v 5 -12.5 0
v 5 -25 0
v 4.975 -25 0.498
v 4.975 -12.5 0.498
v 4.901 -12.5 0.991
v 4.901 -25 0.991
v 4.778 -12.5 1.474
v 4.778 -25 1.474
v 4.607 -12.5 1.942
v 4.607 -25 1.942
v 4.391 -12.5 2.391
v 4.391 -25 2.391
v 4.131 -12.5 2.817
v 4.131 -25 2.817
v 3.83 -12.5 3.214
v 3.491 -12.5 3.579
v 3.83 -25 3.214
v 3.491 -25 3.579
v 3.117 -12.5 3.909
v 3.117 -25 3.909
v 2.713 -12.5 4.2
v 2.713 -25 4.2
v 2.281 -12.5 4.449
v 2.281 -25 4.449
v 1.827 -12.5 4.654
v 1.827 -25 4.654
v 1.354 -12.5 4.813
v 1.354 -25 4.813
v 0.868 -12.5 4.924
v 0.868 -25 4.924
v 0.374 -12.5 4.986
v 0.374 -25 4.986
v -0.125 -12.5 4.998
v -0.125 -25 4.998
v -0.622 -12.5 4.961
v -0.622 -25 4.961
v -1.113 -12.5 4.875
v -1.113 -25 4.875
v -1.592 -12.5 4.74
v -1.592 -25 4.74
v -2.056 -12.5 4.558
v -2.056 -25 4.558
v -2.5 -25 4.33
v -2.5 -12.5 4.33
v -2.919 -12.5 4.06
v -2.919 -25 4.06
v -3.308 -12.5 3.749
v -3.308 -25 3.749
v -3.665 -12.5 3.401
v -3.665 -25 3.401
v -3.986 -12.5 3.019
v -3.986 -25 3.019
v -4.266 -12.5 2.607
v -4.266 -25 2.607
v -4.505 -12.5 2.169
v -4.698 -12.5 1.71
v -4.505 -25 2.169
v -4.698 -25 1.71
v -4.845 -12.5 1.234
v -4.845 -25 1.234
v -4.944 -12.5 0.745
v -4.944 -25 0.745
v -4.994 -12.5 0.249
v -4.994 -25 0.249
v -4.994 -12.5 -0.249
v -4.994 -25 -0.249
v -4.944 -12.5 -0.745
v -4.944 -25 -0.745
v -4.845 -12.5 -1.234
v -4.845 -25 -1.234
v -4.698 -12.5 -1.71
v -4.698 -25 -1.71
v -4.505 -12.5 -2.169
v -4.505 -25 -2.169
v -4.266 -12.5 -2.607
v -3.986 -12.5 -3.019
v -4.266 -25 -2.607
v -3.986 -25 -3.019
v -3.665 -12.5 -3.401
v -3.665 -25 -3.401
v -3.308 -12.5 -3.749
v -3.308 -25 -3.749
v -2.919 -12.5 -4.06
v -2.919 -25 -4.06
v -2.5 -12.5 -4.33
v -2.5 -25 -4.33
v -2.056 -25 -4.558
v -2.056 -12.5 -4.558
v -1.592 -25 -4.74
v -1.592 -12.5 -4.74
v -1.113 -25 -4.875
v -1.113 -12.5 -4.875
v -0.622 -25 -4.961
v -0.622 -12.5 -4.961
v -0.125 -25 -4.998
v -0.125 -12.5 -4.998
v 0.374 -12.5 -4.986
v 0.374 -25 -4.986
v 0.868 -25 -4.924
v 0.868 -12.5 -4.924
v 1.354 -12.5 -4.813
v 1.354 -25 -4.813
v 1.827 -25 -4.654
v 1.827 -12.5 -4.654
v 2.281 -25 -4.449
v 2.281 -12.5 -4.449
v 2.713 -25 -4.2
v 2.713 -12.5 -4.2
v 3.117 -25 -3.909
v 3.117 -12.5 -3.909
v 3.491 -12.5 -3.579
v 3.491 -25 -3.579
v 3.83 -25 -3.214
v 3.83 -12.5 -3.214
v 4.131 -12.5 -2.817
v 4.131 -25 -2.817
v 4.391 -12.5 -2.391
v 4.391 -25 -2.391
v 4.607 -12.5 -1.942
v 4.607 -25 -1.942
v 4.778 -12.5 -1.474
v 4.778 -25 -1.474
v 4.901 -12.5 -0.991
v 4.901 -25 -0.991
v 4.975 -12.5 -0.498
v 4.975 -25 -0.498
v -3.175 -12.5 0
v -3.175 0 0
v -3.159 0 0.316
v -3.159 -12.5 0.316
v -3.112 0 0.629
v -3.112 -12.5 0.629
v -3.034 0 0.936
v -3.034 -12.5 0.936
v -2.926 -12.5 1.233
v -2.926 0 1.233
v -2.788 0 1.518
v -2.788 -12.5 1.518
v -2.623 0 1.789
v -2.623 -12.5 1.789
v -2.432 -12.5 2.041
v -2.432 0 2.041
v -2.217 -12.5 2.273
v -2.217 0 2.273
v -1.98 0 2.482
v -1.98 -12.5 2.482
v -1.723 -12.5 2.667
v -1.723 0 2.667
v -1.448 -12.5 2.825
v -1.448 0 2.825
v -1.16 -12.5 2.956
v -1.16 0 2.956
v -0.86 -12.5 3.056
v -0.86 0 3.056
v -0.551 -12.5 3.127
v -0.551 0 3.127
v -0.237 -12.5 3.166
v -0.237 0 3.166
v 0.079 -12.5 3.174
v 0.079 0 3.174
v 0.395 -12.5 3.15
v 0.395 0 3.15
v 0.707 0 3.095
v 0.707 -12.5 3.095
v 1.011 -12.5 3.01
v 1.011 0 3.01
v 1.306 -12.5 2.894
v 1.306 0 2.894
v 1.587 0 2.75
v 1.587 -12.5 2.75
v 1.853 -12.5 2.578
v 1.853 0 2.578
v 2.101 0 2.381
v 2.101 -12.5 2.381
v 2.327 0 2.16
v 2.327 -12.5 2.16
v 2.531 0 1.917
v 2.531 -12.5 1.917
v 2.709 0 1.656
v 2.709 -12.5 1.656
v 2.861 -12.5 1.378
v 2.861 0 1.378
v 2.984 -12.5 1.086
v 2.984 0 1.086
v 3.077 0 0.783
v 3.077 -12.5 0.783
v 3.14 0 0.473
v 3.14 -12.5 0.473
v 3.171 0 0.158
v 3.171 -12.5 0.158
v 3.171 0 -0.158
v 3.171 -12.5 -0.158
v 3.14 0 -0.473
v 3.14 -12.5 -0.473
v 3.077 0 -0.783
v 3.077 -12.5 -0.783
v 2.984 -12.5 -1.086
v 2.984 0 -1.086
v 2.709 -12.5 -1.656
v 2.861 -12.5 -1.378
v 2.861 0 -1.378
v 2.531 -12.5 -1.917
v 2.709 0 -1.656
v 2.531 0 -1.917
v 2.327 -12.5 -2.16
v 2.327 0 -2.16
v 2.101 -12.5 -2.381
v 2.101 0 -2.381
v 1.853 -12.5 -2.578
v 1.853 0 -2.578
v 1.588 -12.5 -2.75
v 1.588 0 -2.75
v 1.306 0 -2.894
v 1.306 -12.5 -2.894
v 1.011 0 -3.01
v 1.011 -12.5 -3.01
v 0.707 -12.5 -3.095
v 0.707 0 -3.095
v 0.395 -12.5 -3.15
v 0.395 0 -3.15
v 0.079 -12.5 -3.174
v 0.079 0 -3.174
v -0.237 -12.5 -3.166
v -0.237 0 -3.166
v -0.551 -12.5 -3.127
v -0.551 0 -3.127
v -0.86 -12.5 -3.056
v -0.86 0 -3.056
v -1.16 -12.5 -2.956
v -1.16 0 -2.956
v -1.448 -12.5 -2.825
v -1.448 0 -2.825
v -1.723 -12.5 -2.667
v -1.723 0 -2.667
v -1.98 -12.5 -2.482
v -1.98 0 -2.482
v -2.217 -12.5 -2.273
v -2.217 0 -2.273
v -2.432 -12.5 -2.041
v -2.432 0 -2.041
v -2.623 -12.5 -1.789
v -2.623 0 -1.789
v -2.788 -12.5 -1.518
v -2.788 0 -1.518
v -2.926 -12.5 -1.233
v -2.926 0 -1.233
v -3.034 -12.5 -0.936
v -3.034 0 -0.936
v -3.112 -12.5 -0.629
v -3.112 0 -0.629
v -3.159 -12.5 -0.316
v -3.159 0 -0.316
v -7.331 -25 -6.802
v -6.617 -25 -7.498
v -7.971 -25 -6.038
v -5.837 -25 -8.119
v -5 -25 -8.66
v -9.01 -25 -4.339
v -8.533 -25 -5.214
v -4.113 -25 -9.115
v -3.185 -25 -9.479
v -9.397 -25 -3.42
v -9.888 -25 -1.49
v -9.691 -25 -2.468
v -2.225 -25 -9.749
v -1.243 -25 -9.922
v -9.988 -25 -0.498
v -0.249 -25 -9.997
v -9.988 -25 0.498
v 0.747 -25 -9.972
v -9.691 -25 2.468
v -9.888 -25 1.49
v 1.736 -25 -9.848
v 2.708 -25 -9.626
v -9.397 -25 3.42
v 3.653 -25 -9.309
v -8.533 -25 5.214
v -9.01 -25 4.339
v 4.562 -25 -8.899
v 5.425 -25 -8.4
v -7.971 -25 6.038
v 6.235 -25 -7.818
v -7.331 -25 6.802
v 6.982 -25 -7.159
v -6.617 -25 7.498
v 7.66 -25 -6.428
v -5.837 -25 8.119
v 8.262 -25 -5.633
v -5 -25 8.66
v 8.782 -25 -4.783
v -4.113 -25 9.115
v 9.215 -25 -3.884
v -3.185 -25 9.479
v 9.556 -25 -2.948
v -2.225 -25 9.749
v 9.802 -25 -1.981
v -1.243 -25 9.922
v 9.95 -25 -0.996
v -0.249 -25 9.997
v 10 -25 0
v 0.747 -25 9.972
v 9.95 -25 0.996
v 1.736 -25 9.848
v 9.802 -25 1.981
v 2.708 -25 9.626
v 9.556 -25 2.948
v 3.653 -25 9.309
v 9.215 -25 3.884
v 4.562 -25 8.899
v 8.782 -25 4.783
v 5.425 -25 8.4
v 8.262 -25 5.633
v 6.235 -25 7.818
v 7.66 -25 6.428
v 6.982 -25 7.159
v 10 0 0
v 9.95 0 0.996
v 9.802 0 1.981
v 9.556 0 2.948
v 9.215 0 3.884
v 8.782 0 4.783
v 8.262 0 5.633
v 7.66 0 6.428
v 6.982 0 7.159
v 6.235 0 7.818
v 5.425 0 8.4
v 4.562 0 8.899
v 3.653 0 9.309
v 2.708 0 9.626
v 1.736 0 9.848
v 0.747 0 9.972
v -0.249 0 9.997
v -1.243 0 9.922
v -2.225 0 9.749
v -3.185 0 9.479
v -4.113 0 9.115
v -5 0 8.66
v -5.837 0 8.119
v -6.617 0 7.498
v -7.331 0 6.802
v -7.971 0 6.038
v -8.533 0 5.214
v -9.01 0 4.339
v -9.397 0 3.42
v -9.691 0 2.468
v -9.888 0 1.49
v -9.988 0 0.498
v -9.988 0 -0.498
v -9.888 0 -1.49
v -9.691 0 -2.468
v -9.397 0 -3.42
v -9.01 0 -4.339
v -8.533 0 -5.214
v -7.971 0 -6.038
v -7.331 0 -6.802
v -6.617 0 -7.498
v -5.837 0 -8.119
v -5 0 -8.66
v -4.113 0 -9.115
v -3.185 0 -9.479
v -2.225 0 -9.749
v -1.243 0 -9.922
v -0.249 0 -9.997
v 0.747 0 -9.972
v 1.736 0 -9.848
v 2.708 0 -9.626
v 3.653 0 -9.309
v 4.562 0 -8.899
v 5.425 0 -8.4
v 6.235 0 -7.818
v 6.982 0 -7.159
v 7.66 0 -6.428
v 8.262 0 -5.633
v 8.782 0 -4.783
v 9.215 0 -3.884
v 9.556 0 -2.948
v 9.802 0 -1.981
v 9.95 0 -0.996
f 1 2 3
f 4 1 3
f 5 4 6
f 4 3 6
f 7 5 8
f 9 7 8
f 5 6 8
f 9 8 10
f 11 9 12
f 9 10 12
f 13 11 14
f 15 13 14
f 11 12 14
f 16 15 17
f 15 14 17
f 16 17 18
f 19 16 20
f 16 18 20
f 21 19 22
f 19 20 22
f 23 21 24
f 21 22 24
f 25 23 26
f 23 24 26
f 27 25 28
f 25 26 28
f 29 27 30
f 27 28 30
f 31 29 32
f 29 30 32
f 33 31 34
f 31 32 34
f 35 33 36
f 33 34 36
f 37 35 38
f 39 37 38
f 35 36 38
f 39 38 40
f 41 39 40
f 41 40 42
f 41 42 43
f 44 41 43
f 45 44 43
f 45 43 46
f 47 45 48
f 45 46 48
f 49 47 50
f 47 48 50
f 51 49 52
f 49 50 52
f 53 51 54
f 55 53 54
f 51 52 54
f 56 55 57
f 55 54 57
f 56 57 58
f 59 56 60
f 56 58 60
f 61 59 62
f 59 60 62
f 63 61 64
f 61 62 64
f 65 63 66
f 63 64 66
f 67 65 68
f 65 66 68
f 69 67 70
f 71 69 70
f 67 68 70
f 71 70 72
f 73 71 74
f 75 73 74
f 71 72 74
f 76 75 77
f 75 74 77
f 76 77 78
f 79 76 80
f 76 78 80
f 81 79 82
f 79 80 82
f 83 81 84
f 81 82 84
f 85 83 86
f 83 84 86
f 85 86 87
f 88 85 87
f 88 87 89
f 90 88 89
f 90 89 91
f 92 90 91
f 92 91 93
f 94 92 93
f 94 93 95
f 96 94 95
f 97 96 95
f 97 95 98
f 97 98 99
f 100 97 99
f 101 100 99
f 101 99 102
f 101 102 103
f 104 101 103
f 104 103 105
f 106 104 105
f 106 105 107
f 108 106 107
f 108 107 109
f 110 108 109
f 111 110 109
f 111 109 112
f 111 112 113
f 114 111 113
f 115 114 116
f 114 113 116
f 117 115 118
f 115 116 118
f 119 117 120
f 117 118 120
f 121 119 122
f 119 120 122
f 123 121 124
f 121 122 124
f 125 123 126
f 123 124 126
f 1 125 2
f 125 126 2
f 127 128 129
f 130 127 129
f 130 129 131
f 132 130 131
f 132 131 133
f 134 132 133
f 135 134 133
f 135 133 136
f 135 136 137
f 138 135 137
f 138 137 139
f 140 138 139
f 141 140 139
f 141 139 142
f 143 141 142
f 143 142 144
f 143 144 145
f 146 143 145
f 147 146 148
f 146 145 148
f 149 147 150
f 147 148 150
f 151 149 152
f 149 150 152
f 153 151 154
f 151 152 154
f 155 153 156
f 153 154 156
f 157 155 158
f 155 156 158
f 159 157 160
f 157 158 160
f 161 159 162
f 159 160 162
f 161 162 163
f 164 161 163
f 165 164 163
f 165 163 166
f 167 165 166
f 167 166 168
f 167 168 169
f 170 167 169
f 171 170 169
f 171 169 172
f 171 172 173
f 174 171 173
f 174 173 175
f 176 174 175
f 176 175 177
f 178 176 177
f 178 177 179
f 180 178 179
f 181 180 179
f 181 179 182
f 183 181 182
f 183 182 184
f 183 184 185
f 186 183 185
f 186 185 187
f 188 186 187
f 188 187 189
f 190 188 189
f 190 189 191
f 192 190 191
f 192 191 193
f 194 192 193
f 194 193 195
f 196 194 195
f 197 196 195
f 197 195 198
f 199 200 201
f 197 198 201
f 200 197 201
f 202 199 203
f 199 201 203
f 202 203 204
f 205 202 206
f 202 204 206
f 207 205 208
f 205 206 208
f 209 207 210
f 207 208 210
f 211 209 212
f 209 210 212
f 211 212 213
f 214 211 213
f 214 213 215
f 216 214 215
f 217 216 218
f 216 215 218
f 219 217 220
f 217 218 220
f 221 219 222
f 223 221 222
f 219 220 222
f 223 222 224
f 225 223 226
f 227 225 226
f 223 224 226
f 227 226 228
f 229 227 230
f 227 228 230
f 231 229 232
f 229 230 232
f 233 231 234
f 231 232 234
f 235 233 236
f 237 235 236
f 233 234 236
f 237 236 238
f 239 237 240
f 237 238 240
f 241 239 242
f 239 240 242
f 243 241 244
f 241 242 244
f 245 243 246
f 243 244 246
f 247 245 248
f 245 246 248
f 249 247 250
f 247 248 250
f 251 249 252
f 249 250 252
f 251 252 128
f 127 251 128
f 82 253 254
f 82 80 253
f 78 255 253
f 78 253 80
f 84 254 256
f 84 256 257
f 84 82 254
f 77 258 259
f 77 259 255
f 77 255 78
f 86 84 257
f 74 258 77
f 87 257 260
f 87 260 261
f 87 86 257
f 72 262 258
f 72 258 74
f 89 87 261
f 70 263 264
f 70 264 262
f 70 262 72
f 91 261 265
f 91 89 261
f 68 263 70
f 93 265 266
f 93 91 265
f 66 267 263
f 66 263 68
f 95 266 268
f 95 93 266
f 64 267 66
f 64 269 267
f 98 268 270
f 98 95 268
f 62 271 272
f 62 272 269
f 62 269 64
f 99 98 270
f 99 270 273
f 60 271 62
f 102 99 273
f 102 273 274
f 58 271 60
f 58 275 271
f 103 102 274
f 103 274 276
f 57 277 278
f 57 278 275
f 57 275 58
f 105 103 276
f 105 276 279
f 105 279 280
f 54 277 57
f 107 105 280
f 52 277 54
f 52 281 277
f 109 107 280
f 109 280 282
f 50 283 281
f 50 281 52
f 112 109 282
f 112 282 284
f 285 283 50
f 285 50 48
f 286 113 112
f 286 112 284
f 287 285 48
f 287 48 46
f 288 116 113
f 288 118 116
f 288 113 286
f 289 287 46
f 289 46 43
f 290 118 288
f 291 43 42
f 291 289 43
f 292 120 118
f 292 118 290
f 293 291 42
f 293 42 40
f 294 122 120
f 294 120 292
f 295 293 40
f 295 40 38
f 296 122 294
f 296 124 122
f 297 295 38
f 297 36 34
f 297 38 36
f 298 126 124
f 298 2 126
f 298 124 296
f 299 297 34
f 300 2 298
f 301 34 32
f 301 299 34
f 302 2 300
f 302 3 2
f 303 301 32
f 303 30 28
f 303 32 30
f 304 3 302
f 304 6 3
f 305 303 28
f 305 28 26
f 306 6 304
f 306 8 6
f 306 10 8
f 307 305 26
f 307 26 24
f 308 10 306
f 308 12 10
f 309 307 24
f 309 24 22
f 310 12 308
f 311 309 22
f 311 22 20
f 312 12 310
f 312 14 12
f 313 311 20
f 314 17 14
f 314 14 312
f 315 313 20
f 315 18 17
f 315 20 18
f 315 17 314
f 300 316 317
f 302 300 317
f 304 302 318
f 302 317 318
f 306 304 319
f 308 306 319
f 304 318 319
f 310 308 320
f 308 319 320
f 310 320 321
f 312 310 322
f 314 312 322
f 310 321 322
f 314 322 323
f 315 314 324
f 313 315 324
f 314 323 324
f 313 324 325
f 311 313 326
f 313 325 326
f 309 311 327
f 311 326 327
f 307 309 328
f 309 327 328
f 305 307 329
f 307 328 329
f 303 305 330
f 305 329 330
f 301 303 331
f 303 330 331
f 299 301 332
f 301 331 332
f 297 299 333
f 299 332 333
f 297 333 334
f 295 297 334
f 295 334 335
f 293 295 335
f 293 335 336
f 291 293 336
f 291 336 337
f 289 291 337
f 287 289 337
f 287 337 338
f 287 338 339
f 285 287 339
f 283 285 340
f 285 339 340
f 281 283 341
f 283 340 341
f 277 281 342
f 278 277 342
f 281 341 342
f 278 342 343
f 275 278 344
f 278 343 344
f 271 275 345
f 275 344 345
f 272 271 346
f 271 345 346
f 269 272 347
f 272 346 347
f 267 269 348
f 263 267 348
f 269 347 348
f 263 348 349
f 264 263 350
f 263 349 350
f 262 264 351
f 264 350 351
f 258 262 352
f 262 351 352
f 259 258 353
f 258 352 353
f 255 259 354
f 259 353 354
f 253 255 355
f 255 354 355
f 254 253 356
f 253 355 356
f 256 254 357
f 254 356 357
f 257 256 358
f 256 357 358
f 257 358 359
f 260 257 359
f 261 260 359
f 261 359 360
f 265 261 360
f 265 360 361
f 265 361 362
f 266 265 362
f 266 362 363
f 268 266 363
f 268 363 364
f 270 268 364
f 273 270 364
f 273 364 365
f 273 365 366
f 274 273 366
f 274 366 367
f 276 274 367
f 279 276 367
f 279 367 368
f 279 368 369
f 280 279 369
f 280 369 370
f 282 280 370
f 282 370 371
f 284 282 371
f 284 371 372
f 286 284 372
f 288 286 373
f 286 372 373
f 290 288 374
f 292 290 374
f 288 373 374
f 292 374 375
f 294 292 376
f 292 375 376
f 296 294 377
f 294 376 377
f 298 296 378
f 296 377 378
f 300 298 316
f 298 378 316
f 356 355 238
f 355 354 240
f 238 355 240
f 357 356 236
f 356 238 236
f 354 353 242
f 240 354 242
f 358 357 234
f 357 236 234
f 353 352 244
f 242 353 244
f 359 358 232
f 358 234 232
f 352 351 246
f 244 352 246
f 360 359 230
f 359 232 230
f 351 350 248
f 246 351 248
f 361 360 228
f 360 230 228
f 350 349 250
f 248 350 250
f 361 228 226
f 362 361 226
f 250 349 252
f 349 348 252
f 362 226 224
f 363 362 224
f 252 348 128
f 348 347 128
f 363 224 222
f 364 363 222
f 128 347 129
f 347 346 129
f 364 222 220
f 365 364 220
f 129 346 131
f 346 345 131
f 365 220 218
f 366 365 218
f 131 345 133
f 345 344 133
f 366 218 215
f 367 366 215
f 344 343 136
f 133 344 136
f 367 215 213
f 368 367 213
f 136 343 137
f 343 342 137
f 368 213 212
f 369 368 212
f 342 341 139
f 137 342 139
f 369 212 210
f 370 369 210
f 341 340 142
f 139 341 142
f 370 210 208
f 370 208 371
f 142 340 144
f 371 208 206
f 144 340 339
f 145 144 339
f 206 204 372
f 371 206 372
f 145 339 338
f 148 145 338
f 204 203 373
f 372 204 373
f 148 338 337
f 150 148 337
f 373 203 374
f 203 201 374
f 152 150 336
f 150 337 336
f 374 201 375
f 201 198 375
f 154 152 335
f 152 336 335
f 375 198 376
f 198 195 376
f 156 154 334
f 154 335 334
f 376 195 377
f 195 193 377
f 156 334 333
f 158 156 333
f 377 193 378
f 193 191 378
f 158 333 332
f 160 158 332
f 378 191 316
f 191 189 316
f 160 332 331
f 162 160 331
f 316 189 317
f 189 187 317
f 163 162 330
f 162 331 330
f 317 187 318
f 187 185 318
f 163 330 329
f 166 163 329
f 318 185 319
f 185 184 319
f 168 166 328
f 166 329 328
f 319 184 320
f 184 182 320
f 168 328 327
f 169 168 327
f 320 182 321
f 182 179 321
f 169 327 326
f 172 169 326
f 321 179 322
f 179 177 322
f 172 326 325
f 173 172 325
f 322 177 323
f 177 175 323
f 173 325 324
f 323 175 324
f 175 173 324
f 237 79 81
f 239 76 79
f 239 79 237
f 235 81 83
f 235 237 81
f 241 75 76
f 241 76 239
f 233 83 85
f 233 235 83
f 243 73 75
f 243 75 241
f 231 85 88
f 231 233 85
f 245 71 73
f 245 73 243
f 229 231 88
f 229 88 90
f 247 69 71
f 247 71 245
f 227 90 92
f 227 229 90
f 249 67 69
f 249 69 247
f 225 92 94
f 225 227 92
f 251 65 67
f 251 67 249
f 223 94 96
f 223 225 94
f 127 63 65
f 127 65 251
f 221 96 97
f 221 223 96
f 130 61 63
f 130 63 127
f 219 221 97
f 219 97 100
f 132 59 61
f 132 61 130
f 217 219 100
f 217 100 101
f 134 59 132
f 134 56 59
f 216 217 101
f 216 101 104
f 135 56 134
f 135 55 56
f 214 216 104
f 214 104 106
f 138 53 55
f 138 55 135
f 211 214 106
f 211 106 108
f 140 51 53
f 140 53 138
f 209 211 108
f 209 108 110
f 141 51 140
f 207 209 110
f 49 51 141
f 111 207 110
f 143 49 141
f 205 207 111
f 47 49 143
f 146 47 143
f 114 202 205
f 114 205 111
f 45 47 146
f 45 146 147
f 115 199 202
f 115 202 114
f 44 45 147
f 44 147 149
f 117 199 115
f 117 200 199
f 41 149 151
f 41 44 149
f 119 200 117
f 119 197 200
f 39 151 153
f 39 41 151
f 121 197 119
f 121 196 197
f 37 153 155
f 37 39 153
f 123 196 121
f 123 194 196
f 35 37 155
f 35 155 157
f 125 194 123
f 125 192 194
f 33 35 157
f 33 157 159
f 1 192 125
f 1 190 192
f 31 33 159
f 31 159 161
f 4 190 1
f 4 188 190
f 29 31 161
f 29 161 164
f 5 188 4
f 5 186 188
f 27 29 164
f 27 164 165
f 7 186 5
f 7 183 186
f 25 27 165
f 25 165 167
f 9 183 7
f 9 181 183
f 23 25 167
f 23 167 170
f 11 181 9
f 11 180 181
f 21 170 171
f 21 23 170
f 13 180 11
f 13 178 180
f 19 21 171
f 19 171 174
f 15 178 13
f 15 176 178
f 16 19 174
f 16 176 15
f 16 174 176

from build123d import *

# Parameters (mm, degrees)
F0_R     = 10
F1_DEPTH = 25
F2_R     = 5
F3_DEPTH = 12.5
F4_R     = 3.175
F5_DEPTH = 25.001


with BuildPart() as f1:
    # F0 (on Front) → F1 (new body)
    with BuildSketch(Plane.XZ):
        Circle(F0_R)
    extrude(amount=F1_DEPTH)

    # F2 (on face) → F3 (cut)
    with BuildSketch(Plane.XZ.offset(25)):
        Circle(F2_R)
    extrude(amount=-F3_DEPTH, mode=Mode.SUBTRACT)

    # F4 (on face) → F5 (cut, through all)
    with BuildSketch(Plane(origin=(0, 0, 0), x_dir=(-1, 0, 0), z_dir=(0, 1, 0))):
        Circle(F4_R)
    extrude(amount=-F5_DEPTH, mode=Mode.SUBTRACT)


solid = f1.part
